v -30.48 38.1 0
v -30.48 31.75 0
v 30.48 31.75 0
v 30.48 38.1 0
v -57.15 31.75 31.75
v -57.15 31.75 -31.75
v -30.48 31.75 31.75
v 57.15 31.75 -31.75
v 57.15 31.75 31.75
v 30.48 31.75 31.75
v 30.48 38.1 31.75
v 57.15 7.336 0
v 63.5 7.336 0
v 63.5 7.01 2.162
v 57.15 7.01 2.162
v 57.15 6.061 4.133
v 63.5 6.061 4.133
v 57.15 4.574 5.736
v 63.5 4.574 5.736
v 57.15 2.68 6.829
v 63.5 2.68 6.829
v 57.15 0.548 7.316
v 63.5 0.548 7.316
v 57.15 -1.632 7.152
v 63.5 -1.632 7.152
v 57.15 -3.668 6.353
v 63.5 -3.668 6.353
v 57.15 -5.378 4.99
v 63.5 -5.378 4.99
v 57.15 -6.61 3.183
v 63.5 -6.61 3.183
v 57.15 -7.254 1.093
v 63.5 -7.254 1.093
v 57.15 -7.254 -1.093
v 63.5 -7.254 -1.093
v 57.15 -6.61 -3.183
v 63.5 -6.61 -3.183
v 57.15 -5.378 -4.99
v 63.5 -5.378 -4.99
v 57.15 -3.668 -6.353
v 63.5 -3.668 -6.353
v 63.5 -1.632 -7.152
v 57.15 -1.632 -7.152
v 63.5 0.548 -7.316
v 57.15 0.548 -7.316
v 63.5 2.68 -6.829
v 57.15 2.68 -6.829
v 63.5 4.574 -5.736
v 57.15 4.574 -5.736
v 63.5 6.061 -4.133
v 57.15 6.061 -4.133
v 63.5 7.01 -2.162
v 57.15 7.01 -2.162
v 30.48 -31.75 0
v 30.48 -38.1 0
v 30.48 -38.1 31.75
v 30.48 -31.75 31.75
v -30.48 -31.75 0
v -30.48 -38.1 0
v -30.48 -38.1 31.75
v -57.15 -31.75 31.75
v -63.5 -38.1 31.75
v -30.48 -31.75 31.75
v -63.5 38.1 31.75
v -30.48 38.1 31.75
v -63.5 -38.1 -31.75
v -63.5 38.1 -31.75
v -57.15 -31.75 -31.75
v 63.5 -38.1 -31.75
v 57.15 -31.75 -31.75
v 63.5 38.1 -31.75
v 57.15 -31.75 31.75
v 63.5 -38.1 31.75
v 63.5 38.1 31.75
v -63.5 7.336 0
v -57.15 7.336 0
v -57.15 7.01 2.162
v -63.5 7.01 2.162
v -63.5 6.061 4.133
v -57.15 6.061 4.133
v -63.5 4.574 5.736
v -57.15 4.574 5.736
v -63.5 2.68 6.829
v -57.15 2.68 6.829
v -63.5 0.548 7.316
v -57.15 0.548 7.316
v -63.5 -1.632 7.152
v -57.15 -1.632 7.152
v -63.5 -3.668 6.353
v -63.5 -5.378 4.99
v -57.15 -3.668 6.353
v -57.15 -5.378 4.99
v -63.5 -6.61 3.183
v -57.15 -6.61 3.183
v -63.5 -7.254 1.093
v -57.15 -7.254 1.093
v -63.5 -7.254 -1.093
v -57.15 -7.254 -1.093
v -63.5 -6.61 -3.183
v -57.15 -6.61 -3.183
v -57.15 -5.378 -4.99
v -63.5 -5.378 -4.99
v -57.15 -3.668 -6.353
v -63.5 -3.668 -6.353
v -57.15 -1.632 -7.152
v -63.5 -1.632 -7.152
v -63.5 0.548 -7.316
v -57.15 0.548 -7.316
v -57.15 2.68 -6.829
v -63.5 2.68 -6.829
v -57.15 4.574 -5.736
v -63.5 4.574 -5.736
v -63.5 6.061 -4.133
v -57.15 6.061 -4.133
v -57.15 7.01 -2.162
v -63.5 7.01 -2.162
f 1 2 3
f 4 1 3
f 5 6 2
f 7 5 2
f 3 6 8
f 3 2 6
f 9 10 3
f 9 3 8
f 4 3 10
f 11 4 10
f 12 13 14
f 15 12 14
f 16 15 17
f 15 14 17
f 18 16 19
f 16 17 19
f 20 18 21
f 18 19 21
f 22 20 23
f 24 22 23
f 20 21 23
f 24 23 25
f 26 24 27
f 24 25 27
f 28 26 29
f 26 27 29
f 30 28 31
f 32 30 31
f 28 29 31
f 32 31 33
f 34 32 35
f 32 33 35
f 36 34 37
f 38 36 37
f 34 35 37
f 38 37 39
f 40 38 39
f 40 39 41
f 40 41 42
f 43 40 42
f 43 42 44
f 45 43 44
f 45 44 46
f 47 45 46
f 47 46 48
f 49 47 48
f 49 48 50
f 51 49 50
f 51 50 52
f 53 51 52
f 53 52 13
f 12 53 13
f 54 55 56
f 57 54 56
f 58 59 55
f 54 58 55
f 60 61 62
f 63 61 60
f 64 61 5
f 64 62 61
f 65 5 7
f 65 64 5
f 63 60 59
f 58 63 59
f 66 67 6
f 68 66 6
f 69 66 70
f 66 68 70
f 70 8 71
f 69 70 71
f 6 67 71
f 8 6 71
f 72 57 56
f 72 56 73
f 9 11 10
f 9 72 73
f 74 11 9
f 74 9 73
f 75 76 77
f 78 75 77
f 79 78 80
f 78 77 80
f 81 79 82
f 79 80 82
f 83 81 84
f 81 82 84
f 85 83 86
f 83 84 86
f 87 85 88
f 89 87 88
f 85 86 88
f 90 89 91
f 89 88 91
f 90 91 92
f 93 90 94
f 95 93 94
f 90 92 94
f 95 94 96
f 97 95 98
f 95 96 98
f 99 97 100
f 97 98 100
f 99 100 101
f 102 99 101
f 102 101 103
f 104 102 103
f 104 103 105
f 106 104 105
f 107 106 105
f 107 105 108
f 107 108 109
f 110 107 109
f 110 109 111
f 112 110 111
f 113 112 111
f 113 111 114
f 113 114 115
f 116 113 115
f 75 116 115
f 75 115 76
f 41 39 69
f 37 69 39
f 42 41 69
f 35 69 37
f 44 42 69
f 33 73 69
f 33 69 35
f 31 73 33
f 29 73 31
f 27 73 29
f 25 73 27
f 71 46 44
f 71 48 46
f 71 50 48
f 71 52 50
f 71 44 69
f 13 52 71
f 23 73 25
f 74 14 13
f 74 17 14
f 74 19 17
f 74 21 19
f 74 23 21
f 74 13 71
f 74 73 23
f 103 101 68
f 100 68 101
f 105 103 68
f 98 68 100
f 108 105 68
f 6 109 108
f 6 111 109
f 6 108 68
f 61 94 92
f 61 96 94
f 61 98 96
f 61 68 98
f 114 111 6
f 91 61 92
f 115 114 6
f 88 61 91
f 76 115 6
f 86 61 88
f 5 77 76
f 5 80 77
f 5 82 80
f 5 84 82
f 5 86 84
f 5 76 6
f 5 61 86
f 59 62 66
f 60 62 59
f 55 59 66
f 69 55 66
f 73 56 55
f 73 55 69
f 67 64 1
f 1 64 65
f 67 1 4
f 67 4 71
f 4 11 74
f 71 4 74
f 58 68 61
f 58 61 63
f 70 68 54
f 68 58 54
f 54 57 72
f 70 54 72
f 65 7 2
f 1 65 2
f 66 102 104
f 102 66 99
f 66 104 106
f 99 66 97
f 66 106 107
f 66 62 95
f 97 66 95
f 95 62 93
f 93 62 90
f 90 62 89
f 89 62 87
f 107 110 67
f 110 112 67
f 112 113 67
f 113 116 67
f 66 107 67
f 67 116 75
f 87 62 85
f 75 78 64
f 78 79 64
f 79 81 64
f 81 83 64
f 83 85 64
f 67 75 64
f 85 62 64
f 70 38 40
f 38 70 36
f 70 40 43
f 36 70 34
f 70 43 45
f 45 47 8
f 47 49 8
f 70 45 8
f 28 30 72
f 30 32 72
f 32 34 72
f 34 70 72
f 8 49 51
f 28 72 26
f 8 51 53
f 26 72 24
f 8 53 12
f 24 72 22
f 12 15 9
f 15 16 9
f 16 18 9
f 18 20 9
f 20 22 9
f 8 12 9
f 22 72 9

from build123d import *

# Parameters (mm, degrees)
F0_W     = 127
F0_H     = 76.2
F0_W_2   = 114.3
F0_H_2   = 63.5
F1_DEPTH = 31.75
F3_DEPTH = 101.6
F4_R     = 7.336255
F5_DEPTH = 127


with BuildPart() as f1:
    # F0 (on Top) → F1 (new body, symmetric)
    with BuildSketch(Plane.XY):
        Rectangle(F0_W, F0_H)
        Rectangle(F0_W_2, F0_H_2, mode=Mode.SUBTRACT)
    extrude(amount=F1_DEPTH, both=True)

    # F2 (on face) → F3 (cut)
    with BuildSketch(Plane.XZ.offset(38.1)):
        Polygon((30.48, 31.75), (-30.48, 31.75), (-30.48, 0), (0, 0), (30.48, 0), align=None)
    extrude(amount=-F3_DEPTH, mode=Mode.SUBTRACT)

    # F4 (on face) → F5 (cut)
    with BuildSketch(Plane.YZ.offset(63.5)):
        Circle(F4_R)
    extrude(amount=-F5_DEPTH, mode=Mode.SUBTRACT)


solid = f1.part
